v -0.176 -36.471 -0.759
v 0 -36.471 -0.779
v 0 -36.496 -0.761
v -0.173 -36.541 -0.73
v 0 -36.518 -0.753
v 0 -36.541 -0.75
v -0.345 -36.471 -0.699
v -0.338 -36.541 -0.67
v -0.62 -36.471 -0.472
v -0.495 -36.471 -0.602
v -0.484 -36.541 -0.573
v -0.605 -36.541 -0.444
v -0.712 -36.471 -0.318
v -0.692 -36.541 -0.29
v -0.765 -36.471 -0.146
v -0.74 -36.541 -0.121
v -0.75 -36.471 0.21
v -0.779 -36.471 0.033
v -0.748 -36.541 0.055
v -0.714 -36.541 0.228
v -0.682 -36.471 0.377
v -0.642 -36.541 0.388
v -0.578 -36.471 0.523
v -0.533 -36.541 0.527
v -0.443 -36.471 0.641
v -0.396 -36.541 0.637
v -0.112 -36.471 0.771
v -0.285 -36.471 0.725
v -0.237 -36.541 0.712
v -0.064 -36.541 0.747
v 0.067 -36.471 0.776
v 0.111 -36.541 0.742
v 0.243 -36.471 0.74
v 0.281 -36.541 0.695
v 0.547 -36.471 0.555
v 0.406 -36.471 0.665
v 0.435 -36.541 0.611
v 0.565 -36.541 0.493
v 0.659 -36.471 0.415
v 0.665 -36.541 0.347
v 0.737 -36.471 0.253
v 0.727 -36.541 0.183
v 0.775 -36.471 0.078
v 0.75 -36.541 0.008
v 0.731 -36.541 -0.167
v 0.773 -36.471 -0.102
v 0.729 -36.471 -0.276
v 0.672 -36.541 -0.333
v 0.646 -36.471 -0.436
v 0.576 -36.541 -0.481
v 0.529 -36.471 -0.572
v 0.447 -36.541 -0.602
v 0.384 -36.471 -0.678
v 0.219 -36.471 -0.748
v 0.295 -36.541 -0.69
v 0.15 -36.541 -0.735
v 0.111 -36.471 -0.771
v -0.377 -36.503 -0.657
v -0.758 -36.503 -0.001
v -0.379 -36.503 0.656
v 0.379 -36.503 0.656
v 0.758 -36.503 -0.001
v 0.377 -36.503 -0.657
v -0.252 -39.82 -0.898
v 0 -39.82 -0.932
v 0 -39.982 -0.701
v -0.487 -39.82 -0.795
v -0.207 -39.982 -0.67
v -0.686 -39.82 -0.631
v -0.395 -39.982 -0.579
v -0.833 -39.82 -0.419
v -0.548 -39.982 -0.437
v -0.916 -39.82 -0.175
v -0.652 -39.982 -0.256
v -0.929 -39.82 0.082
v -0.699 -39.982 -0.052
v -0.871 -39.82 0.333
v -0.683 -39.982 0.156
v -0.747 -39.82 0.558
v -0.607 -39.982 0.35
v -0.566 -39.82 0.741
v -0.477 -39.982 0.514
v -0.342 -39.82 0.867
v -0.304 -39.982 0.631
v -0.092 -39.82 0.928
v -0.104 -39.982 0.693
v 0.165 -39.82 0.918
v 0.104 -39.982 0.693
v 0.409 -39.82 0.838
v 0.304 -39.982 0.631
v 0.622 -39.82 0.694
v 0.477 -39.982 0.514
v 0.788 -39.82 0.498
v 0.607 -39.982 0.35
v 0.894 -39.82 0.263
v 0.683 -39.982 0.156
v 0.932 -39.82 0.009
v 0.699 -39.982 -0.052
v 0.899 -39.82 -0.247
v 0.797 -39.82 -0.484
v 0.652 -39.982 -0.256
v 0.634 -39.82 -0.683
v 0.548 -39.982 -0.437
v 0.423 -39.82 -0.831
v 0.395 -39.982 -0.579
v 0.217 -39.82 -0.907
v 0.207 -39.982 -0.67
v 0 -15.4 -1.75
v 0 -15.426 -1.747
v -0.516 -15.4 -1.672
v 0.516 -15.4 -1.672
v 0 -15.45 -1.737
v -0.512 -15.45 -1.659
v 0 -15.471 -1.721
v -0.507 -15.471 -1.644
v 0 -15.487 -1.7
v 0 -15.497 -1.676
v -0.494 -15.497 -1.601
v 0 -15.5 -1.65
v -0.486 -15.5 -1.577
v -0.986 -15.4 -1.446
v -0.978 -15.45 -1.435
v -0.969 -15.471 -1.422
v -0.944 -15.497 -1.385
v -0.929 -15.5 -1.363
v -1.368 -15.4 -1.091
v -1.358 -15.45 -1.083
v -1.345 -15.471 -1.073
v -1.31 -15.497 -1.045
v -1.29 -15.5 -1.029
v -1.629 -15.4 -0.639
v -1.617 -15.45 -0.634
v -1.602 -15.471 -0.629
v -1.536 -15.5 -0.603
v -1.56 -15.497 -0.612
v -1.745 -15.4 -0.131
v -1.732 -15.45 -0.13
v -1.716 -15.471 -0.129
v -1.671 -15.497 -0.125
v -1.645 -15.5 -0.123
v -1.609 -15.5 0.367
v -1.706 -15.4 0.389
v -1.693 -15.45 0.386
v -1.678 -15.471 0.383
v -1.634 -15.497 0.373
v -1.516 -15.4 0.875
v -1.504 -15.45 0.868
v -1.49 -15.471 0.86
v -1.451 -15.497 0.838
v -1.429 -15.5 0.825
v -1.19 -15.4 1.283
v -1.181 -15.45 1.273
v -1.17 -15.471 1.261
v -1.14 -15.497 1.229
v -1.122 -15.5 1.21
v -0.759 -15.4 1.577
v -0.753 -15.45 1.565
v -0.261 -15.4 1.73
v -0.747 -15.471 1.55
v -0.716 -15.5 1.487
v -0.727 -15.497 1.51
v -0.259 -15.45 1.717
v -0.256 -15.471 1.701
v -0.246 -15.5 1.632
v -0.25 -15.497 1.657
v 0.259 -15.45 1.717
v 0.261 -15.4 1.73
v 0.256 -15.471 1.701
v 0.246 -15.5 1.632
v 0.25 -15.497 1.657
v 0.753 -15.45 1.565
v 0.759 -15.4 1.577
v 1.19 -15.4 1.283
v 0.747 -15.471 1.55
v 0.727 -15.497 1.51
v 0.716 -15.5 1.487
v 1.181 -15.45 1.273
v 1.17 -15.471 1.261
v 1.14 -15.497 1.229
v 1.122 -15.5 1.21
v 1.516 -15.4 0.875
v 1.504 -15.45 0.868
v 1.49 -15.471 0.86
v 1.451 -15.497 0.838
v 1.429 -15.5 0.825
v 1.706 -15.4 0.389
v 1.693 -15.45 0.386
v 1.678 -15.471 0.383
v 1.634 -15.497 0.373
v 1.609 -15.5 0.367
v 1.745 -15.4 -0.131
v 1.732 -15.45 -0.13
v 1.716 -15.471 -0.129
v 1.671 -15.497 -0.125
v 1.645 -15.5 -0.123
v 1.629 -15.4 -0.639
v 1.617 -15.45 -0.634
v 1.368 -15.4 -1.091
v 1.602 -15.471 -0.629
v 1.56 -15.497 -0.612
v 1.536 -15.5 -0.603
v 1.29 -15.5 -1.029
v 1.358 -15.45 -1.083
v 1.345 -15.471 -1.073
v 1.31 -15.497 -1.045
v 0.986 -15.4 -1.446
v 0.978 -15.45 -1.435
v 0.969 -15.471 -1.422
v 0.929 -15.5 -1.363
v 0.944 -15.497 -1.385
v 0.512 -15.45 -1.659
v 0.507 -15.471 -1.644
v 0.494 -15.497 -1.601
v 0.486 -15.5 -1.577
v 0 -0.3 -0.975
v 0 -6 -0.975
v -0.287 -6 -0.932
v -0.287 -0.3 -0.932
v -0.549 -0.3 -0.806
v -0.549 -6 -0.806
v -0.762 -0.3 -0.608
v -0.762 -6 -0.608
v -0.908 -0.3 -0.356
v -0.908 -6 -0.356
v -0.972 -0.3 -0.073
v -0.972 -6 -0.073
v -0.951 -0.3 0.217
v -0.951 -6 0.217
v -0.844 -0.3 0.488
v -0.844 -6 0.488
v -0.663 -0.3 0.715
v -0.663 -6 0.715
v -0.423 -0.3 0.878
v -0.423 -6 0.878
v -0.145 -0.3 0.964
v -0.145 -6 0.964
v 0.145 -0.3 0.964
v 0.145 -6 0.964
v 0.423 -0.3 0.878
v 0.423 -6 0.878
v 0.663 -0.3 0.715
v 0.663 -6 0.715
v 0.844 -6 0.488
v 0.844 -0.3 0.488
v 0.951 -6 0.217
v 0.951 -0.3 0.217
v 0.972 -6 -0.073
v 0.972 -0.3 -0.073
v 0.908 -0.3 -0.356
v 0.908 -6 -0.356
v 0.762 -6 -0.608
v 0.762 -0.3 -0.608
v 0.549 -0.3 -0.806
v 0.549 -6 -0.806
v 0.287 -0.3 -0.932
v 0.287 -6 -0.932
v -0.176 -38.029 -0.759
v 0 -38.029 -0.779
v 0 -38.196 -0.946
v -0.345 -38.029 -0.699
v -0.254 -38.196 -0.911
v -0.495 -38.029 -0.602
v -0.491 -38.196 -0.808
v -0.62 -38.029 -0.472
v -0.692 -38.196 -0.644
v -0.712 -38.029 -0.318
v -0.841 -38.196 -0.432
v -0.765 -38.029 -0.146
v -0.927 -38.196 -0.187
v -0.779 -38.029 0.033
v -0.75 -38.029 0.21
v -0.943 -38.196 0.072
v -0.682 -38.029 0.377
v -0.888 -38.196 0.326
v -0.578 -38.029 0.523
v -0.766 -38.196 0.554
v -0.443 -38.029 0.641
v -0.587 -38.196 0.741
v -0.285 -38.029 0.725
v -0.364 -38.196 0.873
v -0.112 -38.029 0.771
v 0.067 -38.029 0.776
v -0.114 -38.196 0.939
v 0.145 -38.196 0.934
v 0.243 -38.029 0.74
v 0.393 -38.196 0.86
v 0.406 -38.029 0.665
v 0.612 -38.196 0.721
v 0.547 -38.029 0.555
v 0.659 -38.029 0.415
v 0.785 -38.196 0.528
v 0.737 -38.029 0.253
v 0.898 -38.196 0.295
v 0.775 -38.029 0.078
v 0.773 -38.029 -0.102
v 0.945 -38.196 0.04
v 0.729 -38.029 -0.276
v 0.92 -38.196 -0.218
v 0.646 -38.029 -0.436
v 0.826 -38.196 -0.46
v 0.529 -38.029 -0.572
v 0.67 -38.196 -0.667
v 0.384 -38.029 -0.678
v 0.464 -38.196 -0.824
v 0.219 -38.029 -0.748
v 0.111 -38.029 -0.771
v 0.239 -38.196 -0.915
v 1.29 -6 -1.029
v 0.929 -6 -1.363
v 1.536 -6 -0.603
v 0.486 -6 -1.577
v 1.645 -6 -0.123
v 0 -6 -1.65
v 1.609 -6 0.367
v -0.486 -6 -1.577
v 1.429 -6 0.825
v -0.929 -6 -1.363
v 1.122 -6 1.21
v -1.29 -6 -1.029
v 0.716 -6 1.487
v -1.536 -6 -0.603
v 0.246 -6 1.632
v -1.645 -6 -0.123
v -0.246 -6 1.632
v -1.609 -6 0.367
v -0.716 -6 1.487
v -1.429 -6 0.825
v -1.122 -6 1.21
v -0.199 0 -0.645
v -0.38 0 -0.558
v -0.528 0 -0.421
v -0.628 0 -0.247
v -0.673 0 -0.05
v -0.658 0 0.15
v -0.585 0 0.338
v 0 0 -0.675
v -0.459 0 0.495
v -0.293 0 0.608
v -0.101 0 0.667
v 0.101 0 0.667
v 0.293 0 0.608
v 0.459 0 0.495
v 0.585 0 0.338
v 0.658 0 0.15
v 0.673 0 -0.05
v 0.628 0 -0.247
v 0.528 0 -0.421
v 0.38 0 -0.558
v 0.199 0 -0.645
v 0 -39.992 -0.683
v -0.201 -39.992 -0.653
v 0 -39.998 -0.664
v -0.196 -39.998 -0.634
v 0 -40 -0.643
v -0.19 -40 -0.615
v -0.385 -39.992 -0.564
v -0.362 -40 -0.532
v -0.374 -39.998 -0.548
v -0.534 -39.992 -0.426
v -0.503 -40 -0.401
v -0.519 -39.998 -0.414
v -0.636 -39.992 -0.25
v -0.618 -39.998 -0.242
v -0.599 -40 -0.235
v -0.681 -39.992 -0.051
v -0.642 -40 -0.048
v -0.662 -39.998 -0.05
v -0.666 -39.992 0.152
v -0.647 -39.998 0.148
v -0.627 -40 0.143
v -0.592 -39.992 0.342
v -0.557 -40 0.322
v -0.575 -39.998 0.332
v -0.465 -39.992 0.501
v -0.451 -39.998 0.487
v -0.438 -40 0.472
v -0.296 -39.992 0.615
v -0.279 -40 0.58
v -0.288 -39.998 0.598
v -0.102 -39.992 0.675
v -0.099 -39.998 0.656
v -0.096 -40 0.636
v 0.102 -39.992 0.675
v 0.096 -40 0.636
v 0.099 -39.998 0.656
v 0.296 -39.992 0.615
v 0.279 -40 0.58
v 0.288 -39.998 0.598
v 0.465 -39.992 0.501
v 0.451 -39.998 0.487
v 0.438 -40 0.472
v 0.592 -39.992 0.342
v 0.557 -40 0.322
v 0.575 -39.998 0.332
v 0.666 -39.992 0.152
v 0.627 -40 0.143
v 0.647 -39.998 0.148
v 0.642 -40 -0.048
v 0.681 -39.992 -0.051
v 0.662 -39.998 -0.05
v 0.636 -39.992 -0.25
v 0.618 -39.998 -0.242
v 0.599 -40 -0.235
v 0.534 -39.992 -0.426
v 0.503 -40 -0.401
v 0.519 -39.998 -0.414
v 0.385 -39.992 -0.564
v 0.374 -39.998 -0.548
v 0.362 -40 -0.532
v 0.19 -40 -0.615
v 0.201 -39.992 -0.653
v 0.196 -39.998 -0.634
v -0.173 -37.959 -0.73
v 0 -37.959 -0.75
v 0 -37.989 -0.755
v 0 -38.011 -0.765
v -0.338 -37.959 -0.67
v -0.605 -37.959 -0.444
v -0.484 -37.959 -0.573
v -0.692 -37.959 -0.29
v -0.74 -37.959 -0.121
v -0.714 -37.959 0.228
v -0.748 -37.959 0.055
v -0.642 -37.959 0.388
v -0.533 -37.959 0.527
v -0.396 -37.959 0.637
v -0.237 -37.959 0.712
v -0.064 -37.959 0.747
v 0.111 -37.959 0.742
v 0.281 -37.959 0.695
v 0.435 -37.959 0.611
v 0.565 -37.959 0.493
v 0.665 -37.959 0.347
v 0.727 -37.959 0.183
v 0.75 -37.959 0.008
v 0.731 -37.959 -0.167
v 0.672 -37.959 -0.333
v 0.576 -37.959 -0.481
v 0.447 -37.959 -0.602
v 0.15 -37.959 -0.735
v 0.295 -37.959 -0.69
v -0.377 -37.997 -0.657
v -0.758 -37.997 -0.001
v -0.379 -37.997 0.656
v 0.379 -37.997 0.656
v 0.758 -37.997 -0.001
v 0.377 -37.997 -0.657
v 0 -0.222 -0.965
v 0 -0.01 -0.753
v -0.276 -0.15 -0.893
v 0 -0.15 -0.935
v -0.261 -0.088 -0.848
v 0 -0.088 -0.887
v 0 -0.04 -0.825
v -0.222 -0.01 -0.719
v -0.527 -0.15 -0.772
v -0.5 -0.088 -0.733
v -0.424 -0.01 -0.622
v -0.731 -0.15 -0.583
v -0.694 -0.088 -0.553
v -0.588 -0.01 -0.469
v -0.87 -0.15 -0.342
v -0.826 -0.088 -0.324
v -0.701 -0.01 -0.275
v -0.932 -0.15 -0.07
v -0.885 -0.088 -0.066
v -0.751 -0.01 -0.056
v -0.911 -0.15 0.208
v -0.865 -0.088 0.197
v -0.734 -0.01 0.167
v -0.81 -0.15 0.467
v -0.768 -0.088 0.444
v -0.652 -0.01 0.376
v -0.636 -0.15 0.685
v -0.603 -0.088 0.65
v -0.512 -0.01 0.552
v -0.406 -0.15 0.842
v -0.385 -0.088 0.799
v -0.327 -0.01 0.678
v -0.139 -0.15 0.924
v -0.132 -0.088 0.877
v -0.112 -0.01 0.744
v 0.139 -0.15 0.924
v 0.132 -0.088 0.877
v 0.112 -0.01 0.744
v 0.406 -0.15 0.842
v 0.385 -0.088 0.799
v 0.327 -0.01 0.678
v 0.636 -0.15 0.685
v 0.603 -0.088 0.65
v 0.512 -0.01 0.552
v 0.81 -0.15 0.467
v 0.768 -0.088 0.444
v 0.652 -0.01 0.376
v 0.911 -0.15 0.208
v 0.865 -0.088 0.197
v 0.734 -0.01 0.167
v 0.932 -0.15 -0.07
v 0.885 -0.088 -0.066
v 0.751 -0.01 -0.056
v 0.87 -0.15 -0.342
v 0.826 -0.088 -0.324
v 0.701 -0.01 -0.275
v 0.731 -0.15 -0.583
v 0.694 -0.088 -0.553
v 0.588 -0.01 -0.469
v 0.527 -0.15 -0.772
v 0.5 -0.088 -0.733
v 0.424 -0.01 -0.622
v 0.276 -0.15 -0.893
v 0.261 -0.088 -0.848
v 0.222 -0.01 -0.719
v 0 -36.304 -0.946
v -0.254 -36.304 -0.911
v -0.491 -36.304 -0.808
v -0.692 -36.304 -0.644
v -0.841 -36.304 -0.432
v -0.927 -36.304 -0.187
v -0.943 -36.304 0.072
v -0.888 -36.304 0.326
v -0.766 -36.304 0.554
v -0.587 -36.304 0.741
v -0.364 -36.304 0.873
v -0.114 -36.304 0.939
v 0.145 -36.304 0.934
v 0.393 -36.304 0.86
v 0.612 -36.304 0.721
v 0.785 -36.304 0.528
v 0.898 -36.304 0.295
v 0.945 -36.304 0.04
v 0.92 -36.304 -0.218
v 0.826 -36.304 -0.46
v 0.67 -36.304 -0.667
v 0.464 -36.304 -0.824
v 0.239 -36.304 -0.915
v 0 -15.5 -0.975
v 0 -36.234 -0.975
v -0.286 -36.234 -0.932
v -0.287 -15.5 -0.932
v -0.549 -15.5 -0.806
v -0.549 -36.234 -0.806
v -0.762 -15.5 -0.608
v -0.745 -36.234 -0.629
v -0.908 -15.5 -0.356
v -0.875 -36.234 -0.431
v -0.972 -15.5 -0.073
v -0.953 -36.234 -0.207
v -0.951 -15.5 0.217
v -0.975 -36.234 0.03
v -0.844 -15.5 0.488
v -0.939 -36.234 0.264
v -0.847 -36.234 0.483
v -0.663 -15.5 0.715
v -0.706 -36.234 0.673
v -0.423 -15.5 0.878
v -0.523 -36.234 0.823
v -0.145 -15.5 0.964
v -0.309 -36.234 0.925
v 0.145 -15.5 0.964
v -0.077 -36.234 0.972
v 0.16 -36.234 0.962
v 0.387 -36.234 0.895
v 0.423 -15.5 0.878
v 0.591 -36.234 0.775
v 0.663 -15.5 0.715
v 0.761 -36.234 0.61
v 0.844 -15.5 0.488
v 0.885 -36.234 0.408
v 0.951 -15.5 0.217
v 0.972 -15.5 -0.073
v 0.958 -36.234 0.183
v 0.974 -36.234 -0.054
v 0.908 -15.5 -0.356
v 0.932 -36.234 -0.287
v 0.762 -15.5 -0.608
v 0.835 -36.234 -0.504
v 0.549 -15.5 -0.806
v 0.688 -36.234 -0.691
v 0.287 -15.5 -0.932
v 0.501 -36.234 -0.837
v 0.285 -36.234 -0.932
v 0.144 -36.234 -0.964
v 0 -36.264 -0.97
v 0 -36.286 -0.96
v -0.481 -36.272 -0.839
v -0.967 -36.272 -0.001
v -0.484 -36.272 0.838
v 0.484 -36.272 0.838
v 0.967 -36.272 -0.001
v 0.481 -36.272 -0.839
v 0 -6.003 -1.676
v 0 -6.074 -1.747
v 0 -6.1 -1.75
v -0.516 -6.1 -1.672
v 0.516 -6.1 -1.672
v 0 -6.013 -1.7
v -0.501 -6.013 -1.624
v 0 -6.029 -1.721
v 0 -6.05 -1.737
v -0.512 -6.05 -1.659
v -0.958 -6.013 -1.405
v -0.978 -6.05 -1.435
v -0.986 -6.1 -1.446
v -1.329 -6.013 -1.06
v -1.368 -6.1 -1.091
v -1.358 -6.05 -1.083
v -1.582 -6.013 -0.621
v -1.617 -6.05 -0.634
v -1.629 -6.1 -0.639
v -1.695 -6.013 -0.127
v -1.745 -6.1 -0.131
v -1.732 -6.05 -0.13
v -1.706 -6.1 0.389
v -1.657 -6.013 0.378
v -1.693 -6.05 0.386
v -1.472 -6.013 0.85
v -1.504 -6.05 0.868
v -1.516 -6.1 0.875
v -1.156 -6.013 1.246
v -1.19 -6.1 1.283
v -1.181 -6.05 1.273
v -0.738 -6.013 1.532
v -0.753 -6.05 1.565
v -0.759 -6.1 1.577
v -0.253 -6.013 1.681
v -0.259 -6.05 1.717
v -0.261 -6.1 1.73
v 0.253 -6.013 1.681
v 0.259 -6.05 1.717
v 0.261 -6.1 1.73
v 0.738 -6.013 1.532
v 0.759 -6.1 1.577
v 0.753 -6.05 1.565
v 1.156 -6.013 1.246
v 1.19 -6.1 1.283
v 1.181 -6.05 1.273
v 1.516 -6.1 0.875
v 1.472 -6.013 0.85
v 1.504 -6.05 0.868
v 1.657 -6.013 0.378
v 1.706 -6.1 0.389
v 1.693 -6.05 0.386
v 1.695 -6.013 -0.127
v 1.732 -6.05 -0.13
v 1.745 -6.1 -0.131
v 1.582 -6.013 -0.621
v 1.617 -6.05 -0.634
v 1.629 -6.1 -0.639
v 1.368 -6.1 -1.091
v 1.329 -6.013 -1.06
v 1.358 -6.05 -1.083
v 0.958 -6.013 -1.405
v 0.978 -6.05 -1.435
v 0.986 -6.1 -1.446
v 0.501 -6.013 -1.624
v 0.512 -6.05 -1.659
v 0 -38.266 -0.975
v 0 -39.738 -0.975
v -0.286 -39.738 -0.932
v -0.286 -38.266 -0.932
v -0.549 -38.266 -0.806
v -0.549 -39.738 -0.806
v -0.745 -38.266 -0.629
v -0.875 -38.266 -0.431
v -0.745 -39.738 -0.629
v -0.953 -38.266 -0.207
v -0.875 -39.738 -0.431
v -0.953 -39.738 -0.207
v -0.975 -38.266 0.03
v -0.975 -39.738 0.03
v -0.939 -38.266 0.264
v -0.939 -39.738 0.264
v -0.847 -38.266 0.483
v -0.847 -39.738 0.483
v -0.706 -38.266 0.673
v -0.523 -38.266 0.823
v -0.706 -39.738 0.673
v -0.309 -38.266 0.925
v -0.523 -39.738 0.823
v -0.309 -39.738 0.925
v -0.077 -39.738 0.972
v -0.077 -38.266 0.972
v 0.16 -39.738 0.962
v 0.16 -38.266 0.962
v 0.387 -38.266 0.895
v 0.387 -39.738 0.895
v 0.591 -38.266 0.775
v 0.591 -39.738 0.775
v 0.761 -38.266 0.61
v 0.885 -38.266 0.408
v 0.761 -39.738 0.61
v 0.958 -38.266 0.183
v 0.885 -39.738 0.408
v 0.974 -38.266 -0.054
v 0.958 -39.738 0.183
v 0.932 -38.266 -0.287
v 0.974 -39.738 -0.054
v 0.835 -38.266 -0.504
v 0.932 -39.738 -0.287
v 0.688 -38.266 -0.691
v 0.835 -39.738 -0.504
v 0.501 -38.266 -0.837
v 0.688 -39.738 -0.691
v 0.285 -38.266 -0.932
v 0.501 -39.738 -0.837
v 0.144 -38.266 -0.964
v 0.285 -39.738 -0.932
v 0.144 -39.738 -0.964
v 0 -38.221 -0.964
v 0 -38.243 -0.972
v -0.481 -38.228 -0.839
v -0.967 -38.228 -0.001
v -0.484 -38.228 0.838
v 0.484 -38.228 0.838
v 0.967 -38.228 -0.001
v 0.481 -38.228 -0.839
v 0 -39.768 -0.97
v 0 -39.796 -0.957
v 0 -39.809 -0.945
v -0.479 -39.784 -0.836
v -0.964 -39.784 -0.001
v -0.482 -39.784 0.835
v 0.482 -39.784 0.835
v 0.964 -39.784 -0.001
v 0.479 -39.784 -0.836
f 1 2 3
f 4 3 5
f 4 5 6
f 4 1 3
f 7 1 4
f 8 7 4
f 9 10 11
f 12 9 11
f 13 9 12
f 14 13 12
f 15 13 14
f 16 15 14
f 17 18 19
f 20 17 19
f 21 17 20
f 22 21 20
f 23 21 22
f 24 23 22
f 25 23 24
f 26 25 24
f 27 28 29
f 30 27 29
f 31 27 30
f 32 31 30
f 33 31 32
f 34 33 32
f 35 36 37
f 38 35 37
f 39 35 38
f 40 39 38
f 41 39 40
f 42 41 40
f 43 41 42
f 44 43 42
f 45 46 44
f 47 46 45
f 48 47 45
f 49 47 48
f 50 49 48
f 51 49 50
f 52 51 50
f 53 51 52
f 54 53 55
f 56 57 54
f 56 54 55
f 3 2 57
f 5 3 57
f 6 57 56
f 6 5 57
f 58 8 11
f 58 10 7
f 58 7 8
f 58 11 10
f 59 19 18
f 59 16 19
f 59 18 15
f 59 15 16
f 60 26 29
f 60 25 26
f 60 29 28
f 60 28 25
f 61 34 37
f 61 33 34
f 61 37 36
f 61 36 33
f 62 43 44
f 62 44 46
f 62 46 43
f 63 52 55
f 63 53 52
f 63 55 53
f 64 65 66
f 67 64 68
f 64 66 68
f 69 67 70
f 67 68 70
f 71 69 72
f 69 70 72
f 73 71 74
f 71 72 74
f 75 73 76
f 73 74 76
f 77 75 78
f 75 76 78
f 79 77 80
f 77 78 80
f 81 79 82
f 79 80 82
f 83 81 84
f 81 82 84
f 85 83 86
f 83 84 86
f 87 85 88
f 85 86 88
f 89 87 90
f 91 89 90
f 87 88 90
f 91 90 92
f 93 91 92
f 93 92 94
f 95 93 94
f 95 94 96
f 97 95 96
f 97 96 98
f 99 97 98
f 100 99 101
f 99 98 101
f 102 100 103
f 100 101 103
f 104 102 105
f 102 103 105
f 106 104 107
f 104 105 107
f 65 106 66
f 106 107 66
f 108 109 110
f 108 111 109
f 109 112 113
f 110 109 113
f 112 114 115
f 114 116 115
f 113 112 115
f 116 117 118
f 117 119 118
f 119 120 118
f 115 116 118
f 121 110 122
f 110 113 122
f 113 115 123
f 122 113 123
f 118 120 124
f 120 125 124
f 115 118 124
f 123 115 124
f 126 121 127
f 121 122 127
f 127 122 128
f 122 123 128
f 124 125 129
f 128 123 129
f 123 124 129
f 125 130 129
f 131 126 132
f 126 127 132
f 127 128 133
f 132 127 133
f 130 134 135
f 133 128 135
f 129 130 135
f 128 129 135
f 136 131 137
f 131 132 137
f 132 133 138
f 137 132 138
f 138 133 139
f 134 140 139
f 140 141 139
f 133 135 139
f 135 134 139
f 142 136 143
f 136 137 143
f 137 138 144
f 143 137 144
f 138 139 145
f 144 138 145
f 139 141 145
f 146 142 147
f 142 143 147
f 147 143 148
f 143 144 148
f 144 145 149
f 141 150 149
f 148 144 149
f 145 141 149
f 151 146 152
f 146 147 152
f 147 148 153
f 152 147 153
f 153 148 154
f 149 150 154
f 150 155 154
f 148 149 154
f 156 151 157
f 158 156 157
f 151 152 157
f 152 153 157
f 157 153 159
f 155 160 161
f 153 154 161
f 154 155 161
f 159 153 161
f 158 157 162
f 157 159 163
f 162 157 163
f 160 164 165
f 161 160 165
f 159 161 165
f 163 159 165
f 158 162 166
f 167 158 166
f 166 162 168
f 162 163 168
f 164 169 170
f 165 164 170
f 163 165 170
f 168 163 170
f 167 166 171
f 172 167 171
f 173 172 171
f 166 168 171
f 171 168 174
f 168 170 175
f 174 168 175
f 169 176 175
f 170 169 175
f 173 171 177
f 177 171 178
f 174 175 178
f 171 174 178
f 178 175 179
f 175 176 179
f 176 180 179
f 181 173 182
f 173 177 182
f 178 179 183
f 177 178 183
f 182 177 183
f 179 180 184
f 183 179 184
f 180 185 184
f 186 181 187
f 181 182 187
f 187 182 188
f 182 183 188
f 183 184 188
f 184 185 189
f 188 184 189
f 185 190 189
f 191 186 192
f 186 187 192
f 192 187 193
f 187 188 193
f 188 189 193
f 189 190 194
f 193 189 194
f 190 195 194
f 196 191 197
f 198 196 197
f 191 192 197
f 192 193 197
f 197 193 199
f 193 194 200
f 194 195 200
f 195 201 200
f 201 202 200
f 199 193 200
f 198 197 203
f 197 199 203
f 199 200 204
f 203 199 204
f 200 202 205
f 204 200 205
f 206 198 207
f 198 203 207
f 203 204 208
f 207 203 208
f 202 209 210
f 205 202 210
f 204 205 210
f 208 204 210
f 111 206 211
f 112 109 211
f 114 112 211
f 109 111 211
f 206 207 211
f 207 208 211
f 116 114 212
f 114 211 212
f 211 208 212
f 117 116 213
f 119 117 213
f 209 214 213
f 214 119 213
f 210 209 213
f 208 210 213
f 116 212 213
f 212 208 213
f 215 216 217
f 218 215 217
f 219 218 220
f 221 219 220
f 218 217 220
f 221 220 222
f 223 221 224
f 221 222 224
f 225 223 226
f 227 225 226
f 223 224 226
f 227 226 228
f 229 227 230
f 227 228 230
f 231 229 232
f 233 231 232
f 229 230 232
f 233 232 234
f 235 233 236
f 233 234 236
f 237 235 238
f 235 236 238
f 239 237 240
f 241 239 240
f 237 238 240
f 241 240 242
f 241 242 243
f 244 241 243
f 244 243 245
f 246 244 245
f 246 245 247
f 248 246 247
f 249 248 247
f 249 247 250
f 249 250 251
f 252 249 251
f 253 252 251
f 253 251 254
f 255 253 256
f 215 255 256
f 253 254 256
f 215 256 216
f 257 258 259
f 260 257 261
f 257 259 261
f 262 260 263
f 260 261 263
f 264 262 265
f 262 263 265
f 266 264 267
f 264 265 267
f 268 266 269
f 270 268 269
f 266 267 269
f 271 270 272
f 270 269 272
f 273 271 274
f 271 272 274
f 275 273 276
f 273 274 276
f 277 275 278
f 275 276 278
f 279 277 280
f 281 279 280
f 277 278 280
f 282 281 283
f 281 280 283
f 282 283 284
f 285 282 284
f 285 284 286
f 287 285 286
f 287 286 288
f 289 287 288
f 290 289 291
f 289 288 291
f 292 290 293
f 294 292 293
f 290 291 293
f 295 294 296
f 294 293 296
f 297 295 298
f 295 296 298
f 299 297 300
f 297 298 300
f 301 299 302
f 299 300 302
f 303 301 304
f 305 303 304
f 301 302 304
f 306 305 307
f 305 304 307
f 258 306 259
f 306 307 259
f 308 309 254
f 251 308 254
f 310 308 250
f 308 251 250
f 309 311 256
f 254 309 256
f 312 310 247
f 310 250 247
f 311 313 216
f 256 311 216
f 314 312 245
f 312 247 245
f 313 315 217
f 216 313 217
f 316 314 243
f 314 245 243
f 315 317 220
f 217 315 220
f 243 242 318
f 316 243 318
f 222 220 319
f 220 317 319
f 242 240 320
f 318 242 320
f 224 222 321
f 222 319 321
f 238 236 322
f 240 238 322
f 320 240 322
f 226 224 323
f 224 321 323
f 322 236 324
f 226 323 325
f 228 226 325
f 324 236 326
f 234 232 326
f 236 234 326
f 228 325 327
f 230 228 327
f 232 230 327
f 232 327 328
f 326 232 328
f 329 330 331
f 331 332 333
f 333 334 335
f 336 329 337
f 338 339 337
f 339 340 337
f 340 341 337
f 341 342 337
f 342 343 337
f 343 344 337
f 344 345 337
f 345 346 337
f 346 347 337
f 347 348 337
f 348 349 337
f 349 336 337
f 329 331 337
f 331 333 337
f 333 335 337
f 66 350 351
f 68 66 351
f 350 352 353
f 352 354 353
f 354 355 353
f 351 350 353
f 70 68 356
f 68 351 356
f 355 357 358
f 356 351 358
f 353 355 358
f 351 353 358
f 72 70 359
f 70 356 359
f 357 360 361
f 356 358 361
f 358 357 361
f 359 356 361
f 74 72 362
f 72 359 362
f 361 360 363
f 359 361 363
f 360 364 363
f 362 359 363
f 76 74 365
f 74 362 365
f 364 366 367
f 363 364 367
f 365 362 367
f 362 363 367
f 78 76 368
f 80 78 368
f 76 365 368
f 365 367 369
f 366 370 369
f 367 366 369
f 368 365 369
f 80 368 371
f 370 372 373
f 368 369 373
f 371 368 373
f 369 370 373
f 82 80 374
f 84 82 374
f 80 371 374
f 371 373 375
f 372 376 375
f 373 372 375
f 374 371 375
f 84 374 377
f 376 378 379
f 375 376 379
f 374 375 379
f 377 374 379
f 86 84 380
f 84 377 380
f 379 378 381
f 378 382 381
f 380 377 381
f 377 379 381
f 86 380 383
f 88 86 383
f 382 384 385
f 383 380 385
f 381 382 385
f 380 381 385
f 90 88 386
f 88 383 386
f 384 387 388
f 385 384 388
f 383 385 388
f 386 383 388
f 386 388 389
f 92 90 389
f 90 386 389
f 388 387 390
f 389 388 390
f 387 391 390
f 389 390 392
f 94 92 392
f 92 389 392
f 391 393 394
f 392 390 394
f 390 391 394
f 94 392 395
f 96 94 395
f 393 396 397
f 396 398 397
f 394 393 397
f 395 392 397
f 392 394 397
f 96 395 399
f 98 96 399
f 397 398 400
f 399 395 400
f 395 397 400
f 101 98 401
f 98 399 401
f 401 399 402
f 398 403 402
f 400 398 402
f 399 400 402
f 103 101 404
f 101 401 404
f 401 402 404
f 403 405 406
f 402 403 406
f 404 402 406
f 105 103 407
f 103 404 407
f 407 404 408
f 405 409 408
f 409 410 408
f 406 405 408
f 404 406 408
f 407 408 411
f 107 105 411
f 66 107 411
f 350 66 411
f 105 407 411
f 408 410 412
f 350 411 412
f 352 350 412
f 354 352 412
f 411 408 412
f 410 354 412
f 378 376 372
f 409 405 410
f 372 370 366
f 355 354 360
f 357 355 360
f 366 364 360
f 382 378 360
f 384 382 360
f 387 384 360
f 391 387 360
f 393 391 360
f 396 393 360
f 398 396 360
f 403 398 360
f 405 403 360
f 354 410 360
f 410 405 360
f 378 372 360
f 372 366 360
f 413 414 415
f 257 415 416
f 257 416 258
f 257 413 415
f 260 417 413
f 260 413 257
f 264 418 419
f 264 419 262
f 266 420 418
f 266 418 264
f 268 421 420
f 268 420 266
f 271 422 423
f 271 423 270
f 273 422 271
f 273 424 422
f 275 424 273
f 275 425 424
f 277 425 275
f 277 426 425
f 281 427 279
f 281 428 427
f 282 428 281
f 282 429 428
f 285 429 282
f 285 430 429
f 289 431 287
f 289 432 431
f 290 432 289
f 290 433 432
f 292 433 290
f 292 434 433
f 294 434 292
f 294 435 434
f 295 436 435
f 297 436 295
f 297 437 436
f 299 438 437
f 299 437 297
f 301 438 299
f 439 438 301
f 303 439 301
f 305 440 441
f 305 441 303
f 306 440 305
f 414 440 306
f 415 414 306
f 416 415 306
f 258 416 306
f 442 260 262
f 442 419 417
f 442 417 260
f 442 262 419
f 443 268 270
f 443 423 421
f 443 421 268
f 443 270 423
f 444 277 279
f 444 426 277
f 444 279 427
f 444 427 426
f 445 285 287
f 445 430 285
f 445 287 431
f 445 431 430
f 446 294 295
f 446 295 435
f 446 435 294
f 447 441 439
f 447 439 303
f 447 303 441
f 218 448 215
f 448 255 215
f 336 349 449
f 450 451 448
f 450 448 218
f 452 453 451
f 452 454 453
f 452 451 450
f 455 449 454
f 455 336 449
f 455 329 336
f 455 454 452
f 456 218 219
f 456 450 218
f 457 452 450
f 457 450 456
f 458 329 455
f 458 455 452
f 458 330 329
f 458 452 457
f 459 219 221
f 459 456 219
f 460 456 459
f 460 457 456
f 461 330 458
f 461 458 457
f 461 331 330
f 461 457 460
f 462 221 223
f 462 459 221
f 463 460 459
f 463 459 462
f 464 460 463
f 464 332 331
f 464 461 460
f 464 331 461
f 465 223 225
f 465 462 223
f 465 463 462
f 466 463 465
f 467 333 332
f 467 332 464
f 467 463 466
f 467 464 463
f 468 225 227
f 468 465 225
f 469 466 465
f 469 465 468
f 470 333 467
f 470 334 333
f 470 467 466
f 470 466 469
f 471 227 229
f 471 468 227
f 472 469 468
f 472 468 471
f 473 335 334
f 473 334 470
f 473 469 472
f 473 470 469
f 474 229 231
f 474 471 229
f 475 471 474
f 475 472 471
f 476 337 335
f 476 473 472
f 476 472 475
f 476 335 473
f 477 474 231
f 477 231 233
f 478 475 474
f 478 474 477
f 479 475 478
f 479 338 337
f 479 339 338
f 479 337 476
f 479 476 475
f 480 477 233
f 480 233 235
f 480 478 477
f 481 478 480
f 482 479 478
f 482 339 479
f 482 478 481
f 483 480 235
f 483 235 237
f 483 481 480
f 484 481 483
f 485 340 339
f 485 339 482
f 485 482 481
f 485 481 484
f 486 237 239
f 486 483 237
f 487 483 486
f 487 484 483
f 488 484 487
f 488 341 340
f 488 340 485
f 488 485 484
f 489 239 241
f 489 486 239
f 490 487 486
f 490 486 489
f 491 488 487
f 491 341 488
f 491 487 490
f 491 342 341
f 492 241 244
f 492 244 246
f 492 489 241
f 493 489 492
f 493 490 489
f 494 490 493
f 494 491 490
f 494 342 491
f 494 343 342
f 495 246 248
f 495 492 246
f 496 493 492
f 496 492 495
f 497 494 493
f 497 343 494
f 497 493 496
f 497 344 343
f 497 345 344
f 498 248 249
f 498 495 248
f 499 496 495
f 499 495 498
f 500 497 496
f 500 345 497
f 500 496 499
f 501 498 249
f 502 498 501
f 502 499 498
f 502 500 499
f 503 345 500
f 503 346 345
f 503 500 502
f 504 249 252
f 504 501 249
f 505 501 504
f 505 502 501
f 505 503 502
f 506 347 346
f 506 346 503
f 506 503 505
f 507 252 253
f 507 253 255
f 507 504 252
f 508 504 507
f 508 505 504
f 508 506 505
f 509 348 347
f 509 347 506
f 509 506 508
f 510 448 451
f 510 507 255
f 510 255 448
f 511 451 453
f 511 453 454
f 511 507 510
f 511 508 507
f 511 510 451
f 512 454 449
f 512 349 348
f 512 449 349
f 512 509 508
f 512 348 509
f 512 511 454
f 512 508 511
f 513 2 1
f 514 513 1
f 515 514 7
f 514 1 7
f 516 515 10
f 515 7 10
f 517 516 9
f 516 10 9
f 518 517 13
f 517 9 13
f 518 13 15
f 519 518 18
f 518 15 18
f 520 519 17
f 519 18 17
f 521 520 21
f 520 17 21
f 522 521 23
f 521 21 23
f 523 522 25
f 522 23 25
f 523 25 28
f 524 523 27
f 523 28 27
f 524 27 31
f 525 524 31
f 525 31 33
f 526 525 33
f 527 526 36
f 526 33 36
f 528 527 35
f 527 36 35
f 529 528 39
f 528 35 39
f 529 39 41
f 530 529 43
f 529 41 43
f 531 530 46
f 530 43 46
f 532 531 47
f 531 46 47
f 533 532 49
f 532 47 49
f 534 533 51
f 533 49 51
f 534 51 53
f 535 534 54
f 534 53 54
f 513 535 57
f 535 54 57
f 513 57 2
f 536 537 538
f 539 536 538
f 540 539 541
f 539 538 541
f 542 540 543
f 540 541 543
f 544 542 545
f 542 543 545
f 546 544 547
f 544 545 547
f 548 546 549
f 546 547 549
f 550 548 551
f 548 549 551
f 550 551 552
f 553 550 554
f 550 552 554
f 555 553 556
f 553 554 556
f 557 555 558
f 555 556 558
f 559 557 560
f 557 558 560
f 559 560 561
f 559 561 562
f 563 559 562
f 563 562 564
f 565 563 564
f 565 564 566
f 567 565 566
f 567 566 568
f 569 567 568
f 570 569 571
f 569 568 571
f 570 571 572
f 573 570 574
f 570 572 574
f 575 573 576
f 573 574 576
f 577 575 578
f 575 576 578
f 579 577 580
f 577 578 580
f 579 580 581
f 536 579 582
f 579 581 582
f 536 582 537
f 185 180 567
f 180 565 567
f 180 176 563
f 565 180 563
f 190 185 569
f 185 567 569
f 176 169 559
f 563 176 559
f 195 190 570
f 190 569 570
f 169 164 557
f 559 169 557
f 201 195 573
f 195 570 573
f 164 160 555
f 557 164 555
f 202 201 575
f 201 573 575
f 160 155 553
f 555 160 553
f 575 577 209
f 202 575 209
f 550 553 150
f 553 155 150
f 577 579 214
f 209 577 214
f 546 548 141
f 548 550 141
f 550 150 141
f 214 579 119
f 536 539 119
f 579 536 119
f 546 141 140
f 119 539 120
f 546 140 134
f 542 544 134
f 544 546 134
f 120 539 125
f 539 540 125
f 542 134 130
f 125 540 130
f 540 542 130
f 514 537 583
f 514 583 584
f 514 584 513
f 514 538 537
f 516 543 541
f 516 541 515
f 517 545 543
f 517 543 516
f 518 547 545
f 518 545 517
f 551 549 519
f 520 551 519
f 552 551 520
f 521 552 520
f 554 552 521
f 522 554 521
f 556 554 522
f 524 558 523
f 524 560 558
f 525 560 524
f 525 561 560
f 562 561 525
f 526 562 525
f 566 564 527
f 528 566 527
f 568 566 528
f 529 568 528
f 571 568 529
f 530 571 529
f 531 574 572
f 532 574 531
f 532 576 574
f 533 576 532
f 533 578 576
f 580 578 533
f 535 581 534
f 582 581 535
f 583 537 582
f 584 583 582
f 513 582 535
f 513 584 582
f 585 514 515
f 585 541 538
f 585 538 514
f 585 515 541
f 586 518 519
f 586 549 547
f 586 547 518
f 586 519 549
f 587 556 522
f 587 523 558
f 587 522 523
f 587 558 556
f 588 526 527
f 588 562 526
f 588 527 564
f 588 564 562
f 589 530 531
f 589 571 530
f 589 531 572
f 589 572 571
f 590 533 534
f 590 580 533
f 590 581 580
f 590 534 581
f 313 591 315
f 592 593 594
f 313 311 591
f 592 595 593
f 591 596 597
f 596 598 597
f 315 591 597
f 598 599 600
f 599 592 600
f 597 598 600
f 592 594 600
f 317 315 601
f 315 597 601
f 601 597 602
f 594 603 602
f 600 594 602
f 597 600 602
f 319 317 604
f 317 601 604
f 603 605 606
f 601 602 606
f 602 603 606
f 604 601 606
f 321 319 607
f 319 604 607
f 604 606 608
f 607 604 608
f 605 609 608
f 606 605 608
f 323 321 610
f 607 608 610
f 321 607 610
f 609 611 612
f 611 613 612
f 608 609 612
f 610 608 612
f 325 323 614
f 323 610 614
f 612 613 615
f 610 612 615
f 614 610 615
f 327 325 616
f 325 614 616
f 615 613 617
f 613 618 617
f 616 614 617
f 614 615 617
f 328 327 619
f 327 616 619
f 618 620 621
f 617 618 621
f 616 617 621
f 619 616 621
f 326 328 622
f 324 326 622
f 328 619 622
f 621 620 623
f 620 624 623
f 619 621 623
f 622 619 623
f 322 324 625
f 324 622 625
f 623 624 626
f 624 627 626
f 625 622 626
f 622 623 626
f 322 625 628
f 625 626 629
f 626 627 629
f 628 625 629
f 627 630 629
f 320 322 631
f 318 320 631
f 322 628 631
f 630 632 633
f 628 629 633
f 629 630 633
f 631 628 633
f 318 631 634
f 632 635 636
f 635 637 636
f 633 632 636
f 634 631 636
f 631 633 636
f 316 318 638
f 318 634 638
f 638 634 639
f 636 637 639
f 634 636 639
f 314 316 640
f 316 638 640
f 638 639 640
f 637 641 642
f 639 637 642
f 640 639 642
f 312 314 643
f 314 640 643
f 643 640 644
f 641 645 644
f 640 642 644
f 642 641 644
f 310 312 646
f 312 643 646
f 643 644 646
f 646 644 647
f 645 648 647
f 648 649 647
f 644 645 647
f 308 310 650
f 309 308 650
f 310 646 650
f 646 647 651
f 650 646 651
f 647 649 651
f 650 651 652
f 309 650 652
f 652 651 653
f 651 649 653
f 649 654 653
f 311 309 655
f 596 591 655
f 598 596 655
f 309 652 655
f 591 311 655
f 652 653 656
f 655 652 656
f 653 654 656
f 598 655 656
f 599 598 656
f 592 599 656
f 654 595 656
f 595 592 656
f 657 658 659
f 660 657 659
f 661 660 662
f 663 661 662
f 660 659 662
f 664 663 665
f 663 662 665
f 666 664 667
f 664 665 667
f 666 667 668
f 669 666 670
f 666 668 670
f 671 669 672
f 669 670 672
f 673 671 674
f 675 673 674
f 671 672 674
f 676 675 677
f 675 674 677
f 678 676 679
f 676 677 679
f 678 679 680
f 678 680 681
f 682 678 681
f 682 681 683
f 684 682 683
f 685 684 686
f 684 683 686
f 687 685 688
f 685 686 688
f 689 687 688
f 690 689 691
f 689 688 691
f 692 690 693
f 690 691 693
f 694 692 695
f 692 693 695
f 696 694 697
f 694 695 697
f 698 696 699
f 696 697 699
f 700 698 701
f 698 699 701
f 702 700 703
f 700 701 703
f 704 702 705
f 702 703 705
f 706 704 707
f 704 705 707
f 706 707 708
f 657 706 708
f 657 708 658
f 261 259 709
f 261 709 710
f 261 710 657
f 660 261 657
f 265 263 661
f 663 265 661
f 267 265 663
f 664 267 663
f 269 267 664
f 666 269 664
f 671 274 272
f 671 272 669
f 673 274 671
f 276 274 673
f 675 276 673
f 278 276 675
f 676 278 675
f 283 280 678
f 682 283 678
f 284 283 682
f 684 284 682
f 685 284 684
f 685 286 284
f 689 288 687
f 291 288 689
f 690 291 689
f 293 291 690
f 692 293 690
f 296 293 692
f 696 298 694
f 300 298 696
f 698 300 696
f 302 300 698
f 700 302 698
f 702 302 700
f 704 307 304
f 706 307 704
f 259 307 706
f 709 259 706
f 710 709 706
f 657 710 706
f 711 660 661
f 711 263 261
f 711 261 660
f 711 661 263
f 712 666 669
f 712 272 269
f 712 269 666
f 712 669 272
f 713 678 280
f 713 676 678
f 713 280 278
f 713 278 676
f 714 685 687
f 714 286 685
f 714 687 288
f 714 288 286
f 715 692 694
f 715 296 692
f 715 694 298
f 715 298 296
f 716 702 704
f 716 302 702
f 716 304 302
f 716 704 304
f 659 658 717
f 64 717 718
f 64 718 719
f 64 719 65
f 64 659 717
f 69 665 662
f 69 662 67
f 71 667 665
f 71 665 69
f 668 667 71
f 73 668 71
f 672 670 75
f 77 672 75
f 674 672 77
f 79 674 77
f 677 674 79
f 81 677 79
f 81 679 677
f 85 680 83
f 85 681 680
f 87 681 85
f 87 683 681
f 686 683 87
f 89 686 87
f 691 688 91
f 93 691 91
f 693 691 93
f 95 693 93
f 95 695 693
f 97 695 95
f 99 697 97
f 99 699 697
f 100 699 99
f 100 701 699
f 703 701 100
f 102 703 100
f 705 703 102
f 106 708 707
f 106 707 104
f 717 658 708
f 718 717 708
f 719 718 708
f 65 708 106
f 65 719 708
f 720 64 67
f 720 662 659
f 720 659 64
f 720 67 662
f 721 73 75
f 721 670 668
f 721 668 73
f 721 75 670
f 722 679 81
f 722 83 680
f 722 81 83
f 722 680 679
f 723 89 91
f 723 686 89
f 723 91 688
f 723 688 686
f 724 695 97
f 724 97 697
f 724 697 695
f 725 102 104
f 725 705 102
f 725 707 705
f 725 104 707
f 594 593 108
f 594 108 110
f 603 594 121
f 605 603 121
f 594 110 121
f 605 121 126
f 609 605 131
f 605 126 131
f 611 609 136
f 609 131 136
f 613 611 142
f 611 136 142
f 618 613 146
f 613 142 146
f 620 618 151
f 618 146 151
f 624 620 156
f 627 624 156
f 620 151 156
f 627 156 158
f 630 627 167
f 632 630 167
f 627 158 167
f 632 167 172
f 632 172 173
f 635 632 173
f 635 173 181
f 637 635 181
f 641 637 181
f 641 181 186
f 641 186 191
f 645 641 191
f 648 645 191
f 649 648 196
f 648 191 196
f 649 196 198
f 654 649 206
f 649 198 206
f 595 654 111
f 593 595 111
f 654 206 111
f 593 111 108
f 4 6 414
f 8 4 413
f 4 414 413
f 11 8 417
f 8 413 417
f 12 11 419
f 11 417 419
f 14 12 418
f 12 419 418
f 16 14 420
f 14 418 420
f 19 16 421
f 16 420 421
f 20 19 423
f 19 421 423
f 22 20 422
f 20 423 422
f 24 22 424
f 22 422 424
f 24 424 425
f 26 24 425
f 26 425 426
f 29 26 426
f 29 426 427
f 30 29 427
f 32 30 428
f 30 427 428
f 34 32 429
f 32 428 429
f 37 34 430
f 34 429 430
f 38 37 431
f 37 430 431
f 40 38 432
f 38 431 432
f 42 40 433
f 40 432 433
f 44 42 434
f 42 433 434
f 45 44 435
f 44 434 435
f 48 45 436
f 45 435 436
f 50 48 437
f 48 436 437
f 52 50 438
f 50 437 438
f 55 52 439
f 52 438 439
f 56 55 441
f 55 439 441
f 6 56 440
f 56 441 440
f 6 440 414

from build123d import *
from OCP.BRepFilletAPI import BRepFilletAPI_MakeFillet

# Parameters (mm, degrees)
FILLET1_R1 = 0.3
FILLET1_R2 = 0.1


with BuildPart() as part:
    # Sketch1 → Revolve1 (revolve)
    with BuildSketch(Plane(origin=(0, 0, 0), x_dir=(0, 0, -1), z_dir=(1, 0, 0))):
        Polygon((-0.975, 0), (-0.975, -6), (-1.75, -6), (-1.75, -15.5), (-0.975, -15.5), (-0.975, -36.275), (-0.75, -36.5), (-0.75, -38), (-0.975, -38.225), (-0.975, -39.789937739), (-0.675, -40), (0, -40), (0, 0), align=None)
    revolve(axis=Axis((0, -45.705406485, 0), (0, 1, 0)))

    # Fillet1: one fillet with a radius per group of edges: ONE call of the kernel's fillet builder (fillet() takes one radius for all edges)
    fillet1_edges_1 = [part.edges().sort_by_distance(p)[0] for p in [
        (0, 0, -0.975),
    ]]
    fillet1_edges_2 = [part.edges().sort_by_distance(p)[0] for p in [
        (0, -15.5, -1.75),
        (0, -6, -1.75),
        (0, -40, -0.675),
        (0, -39.789937739, -0.975),
        (0, -38.225, -0.975),
        (0, -38, -0.75),
        (0, -36.5, -0.75),
        (0, -36.275, -0.975),
    ]]
    fillet1 = BRepFilletAPI_MakeFillet(part.part.solid().wrapped)
    for e in fillet1_edges_1:
        fillet1.Add(FILLET1_R1, e.wrapped)
    for e in fillet1_edges_2:
        fillet1.Add(FILLET1_R2, e.wrapped)
    add(Compound.cast(fillet1.Shape()), mode=Mode.REPLACE)


solid = part.part
